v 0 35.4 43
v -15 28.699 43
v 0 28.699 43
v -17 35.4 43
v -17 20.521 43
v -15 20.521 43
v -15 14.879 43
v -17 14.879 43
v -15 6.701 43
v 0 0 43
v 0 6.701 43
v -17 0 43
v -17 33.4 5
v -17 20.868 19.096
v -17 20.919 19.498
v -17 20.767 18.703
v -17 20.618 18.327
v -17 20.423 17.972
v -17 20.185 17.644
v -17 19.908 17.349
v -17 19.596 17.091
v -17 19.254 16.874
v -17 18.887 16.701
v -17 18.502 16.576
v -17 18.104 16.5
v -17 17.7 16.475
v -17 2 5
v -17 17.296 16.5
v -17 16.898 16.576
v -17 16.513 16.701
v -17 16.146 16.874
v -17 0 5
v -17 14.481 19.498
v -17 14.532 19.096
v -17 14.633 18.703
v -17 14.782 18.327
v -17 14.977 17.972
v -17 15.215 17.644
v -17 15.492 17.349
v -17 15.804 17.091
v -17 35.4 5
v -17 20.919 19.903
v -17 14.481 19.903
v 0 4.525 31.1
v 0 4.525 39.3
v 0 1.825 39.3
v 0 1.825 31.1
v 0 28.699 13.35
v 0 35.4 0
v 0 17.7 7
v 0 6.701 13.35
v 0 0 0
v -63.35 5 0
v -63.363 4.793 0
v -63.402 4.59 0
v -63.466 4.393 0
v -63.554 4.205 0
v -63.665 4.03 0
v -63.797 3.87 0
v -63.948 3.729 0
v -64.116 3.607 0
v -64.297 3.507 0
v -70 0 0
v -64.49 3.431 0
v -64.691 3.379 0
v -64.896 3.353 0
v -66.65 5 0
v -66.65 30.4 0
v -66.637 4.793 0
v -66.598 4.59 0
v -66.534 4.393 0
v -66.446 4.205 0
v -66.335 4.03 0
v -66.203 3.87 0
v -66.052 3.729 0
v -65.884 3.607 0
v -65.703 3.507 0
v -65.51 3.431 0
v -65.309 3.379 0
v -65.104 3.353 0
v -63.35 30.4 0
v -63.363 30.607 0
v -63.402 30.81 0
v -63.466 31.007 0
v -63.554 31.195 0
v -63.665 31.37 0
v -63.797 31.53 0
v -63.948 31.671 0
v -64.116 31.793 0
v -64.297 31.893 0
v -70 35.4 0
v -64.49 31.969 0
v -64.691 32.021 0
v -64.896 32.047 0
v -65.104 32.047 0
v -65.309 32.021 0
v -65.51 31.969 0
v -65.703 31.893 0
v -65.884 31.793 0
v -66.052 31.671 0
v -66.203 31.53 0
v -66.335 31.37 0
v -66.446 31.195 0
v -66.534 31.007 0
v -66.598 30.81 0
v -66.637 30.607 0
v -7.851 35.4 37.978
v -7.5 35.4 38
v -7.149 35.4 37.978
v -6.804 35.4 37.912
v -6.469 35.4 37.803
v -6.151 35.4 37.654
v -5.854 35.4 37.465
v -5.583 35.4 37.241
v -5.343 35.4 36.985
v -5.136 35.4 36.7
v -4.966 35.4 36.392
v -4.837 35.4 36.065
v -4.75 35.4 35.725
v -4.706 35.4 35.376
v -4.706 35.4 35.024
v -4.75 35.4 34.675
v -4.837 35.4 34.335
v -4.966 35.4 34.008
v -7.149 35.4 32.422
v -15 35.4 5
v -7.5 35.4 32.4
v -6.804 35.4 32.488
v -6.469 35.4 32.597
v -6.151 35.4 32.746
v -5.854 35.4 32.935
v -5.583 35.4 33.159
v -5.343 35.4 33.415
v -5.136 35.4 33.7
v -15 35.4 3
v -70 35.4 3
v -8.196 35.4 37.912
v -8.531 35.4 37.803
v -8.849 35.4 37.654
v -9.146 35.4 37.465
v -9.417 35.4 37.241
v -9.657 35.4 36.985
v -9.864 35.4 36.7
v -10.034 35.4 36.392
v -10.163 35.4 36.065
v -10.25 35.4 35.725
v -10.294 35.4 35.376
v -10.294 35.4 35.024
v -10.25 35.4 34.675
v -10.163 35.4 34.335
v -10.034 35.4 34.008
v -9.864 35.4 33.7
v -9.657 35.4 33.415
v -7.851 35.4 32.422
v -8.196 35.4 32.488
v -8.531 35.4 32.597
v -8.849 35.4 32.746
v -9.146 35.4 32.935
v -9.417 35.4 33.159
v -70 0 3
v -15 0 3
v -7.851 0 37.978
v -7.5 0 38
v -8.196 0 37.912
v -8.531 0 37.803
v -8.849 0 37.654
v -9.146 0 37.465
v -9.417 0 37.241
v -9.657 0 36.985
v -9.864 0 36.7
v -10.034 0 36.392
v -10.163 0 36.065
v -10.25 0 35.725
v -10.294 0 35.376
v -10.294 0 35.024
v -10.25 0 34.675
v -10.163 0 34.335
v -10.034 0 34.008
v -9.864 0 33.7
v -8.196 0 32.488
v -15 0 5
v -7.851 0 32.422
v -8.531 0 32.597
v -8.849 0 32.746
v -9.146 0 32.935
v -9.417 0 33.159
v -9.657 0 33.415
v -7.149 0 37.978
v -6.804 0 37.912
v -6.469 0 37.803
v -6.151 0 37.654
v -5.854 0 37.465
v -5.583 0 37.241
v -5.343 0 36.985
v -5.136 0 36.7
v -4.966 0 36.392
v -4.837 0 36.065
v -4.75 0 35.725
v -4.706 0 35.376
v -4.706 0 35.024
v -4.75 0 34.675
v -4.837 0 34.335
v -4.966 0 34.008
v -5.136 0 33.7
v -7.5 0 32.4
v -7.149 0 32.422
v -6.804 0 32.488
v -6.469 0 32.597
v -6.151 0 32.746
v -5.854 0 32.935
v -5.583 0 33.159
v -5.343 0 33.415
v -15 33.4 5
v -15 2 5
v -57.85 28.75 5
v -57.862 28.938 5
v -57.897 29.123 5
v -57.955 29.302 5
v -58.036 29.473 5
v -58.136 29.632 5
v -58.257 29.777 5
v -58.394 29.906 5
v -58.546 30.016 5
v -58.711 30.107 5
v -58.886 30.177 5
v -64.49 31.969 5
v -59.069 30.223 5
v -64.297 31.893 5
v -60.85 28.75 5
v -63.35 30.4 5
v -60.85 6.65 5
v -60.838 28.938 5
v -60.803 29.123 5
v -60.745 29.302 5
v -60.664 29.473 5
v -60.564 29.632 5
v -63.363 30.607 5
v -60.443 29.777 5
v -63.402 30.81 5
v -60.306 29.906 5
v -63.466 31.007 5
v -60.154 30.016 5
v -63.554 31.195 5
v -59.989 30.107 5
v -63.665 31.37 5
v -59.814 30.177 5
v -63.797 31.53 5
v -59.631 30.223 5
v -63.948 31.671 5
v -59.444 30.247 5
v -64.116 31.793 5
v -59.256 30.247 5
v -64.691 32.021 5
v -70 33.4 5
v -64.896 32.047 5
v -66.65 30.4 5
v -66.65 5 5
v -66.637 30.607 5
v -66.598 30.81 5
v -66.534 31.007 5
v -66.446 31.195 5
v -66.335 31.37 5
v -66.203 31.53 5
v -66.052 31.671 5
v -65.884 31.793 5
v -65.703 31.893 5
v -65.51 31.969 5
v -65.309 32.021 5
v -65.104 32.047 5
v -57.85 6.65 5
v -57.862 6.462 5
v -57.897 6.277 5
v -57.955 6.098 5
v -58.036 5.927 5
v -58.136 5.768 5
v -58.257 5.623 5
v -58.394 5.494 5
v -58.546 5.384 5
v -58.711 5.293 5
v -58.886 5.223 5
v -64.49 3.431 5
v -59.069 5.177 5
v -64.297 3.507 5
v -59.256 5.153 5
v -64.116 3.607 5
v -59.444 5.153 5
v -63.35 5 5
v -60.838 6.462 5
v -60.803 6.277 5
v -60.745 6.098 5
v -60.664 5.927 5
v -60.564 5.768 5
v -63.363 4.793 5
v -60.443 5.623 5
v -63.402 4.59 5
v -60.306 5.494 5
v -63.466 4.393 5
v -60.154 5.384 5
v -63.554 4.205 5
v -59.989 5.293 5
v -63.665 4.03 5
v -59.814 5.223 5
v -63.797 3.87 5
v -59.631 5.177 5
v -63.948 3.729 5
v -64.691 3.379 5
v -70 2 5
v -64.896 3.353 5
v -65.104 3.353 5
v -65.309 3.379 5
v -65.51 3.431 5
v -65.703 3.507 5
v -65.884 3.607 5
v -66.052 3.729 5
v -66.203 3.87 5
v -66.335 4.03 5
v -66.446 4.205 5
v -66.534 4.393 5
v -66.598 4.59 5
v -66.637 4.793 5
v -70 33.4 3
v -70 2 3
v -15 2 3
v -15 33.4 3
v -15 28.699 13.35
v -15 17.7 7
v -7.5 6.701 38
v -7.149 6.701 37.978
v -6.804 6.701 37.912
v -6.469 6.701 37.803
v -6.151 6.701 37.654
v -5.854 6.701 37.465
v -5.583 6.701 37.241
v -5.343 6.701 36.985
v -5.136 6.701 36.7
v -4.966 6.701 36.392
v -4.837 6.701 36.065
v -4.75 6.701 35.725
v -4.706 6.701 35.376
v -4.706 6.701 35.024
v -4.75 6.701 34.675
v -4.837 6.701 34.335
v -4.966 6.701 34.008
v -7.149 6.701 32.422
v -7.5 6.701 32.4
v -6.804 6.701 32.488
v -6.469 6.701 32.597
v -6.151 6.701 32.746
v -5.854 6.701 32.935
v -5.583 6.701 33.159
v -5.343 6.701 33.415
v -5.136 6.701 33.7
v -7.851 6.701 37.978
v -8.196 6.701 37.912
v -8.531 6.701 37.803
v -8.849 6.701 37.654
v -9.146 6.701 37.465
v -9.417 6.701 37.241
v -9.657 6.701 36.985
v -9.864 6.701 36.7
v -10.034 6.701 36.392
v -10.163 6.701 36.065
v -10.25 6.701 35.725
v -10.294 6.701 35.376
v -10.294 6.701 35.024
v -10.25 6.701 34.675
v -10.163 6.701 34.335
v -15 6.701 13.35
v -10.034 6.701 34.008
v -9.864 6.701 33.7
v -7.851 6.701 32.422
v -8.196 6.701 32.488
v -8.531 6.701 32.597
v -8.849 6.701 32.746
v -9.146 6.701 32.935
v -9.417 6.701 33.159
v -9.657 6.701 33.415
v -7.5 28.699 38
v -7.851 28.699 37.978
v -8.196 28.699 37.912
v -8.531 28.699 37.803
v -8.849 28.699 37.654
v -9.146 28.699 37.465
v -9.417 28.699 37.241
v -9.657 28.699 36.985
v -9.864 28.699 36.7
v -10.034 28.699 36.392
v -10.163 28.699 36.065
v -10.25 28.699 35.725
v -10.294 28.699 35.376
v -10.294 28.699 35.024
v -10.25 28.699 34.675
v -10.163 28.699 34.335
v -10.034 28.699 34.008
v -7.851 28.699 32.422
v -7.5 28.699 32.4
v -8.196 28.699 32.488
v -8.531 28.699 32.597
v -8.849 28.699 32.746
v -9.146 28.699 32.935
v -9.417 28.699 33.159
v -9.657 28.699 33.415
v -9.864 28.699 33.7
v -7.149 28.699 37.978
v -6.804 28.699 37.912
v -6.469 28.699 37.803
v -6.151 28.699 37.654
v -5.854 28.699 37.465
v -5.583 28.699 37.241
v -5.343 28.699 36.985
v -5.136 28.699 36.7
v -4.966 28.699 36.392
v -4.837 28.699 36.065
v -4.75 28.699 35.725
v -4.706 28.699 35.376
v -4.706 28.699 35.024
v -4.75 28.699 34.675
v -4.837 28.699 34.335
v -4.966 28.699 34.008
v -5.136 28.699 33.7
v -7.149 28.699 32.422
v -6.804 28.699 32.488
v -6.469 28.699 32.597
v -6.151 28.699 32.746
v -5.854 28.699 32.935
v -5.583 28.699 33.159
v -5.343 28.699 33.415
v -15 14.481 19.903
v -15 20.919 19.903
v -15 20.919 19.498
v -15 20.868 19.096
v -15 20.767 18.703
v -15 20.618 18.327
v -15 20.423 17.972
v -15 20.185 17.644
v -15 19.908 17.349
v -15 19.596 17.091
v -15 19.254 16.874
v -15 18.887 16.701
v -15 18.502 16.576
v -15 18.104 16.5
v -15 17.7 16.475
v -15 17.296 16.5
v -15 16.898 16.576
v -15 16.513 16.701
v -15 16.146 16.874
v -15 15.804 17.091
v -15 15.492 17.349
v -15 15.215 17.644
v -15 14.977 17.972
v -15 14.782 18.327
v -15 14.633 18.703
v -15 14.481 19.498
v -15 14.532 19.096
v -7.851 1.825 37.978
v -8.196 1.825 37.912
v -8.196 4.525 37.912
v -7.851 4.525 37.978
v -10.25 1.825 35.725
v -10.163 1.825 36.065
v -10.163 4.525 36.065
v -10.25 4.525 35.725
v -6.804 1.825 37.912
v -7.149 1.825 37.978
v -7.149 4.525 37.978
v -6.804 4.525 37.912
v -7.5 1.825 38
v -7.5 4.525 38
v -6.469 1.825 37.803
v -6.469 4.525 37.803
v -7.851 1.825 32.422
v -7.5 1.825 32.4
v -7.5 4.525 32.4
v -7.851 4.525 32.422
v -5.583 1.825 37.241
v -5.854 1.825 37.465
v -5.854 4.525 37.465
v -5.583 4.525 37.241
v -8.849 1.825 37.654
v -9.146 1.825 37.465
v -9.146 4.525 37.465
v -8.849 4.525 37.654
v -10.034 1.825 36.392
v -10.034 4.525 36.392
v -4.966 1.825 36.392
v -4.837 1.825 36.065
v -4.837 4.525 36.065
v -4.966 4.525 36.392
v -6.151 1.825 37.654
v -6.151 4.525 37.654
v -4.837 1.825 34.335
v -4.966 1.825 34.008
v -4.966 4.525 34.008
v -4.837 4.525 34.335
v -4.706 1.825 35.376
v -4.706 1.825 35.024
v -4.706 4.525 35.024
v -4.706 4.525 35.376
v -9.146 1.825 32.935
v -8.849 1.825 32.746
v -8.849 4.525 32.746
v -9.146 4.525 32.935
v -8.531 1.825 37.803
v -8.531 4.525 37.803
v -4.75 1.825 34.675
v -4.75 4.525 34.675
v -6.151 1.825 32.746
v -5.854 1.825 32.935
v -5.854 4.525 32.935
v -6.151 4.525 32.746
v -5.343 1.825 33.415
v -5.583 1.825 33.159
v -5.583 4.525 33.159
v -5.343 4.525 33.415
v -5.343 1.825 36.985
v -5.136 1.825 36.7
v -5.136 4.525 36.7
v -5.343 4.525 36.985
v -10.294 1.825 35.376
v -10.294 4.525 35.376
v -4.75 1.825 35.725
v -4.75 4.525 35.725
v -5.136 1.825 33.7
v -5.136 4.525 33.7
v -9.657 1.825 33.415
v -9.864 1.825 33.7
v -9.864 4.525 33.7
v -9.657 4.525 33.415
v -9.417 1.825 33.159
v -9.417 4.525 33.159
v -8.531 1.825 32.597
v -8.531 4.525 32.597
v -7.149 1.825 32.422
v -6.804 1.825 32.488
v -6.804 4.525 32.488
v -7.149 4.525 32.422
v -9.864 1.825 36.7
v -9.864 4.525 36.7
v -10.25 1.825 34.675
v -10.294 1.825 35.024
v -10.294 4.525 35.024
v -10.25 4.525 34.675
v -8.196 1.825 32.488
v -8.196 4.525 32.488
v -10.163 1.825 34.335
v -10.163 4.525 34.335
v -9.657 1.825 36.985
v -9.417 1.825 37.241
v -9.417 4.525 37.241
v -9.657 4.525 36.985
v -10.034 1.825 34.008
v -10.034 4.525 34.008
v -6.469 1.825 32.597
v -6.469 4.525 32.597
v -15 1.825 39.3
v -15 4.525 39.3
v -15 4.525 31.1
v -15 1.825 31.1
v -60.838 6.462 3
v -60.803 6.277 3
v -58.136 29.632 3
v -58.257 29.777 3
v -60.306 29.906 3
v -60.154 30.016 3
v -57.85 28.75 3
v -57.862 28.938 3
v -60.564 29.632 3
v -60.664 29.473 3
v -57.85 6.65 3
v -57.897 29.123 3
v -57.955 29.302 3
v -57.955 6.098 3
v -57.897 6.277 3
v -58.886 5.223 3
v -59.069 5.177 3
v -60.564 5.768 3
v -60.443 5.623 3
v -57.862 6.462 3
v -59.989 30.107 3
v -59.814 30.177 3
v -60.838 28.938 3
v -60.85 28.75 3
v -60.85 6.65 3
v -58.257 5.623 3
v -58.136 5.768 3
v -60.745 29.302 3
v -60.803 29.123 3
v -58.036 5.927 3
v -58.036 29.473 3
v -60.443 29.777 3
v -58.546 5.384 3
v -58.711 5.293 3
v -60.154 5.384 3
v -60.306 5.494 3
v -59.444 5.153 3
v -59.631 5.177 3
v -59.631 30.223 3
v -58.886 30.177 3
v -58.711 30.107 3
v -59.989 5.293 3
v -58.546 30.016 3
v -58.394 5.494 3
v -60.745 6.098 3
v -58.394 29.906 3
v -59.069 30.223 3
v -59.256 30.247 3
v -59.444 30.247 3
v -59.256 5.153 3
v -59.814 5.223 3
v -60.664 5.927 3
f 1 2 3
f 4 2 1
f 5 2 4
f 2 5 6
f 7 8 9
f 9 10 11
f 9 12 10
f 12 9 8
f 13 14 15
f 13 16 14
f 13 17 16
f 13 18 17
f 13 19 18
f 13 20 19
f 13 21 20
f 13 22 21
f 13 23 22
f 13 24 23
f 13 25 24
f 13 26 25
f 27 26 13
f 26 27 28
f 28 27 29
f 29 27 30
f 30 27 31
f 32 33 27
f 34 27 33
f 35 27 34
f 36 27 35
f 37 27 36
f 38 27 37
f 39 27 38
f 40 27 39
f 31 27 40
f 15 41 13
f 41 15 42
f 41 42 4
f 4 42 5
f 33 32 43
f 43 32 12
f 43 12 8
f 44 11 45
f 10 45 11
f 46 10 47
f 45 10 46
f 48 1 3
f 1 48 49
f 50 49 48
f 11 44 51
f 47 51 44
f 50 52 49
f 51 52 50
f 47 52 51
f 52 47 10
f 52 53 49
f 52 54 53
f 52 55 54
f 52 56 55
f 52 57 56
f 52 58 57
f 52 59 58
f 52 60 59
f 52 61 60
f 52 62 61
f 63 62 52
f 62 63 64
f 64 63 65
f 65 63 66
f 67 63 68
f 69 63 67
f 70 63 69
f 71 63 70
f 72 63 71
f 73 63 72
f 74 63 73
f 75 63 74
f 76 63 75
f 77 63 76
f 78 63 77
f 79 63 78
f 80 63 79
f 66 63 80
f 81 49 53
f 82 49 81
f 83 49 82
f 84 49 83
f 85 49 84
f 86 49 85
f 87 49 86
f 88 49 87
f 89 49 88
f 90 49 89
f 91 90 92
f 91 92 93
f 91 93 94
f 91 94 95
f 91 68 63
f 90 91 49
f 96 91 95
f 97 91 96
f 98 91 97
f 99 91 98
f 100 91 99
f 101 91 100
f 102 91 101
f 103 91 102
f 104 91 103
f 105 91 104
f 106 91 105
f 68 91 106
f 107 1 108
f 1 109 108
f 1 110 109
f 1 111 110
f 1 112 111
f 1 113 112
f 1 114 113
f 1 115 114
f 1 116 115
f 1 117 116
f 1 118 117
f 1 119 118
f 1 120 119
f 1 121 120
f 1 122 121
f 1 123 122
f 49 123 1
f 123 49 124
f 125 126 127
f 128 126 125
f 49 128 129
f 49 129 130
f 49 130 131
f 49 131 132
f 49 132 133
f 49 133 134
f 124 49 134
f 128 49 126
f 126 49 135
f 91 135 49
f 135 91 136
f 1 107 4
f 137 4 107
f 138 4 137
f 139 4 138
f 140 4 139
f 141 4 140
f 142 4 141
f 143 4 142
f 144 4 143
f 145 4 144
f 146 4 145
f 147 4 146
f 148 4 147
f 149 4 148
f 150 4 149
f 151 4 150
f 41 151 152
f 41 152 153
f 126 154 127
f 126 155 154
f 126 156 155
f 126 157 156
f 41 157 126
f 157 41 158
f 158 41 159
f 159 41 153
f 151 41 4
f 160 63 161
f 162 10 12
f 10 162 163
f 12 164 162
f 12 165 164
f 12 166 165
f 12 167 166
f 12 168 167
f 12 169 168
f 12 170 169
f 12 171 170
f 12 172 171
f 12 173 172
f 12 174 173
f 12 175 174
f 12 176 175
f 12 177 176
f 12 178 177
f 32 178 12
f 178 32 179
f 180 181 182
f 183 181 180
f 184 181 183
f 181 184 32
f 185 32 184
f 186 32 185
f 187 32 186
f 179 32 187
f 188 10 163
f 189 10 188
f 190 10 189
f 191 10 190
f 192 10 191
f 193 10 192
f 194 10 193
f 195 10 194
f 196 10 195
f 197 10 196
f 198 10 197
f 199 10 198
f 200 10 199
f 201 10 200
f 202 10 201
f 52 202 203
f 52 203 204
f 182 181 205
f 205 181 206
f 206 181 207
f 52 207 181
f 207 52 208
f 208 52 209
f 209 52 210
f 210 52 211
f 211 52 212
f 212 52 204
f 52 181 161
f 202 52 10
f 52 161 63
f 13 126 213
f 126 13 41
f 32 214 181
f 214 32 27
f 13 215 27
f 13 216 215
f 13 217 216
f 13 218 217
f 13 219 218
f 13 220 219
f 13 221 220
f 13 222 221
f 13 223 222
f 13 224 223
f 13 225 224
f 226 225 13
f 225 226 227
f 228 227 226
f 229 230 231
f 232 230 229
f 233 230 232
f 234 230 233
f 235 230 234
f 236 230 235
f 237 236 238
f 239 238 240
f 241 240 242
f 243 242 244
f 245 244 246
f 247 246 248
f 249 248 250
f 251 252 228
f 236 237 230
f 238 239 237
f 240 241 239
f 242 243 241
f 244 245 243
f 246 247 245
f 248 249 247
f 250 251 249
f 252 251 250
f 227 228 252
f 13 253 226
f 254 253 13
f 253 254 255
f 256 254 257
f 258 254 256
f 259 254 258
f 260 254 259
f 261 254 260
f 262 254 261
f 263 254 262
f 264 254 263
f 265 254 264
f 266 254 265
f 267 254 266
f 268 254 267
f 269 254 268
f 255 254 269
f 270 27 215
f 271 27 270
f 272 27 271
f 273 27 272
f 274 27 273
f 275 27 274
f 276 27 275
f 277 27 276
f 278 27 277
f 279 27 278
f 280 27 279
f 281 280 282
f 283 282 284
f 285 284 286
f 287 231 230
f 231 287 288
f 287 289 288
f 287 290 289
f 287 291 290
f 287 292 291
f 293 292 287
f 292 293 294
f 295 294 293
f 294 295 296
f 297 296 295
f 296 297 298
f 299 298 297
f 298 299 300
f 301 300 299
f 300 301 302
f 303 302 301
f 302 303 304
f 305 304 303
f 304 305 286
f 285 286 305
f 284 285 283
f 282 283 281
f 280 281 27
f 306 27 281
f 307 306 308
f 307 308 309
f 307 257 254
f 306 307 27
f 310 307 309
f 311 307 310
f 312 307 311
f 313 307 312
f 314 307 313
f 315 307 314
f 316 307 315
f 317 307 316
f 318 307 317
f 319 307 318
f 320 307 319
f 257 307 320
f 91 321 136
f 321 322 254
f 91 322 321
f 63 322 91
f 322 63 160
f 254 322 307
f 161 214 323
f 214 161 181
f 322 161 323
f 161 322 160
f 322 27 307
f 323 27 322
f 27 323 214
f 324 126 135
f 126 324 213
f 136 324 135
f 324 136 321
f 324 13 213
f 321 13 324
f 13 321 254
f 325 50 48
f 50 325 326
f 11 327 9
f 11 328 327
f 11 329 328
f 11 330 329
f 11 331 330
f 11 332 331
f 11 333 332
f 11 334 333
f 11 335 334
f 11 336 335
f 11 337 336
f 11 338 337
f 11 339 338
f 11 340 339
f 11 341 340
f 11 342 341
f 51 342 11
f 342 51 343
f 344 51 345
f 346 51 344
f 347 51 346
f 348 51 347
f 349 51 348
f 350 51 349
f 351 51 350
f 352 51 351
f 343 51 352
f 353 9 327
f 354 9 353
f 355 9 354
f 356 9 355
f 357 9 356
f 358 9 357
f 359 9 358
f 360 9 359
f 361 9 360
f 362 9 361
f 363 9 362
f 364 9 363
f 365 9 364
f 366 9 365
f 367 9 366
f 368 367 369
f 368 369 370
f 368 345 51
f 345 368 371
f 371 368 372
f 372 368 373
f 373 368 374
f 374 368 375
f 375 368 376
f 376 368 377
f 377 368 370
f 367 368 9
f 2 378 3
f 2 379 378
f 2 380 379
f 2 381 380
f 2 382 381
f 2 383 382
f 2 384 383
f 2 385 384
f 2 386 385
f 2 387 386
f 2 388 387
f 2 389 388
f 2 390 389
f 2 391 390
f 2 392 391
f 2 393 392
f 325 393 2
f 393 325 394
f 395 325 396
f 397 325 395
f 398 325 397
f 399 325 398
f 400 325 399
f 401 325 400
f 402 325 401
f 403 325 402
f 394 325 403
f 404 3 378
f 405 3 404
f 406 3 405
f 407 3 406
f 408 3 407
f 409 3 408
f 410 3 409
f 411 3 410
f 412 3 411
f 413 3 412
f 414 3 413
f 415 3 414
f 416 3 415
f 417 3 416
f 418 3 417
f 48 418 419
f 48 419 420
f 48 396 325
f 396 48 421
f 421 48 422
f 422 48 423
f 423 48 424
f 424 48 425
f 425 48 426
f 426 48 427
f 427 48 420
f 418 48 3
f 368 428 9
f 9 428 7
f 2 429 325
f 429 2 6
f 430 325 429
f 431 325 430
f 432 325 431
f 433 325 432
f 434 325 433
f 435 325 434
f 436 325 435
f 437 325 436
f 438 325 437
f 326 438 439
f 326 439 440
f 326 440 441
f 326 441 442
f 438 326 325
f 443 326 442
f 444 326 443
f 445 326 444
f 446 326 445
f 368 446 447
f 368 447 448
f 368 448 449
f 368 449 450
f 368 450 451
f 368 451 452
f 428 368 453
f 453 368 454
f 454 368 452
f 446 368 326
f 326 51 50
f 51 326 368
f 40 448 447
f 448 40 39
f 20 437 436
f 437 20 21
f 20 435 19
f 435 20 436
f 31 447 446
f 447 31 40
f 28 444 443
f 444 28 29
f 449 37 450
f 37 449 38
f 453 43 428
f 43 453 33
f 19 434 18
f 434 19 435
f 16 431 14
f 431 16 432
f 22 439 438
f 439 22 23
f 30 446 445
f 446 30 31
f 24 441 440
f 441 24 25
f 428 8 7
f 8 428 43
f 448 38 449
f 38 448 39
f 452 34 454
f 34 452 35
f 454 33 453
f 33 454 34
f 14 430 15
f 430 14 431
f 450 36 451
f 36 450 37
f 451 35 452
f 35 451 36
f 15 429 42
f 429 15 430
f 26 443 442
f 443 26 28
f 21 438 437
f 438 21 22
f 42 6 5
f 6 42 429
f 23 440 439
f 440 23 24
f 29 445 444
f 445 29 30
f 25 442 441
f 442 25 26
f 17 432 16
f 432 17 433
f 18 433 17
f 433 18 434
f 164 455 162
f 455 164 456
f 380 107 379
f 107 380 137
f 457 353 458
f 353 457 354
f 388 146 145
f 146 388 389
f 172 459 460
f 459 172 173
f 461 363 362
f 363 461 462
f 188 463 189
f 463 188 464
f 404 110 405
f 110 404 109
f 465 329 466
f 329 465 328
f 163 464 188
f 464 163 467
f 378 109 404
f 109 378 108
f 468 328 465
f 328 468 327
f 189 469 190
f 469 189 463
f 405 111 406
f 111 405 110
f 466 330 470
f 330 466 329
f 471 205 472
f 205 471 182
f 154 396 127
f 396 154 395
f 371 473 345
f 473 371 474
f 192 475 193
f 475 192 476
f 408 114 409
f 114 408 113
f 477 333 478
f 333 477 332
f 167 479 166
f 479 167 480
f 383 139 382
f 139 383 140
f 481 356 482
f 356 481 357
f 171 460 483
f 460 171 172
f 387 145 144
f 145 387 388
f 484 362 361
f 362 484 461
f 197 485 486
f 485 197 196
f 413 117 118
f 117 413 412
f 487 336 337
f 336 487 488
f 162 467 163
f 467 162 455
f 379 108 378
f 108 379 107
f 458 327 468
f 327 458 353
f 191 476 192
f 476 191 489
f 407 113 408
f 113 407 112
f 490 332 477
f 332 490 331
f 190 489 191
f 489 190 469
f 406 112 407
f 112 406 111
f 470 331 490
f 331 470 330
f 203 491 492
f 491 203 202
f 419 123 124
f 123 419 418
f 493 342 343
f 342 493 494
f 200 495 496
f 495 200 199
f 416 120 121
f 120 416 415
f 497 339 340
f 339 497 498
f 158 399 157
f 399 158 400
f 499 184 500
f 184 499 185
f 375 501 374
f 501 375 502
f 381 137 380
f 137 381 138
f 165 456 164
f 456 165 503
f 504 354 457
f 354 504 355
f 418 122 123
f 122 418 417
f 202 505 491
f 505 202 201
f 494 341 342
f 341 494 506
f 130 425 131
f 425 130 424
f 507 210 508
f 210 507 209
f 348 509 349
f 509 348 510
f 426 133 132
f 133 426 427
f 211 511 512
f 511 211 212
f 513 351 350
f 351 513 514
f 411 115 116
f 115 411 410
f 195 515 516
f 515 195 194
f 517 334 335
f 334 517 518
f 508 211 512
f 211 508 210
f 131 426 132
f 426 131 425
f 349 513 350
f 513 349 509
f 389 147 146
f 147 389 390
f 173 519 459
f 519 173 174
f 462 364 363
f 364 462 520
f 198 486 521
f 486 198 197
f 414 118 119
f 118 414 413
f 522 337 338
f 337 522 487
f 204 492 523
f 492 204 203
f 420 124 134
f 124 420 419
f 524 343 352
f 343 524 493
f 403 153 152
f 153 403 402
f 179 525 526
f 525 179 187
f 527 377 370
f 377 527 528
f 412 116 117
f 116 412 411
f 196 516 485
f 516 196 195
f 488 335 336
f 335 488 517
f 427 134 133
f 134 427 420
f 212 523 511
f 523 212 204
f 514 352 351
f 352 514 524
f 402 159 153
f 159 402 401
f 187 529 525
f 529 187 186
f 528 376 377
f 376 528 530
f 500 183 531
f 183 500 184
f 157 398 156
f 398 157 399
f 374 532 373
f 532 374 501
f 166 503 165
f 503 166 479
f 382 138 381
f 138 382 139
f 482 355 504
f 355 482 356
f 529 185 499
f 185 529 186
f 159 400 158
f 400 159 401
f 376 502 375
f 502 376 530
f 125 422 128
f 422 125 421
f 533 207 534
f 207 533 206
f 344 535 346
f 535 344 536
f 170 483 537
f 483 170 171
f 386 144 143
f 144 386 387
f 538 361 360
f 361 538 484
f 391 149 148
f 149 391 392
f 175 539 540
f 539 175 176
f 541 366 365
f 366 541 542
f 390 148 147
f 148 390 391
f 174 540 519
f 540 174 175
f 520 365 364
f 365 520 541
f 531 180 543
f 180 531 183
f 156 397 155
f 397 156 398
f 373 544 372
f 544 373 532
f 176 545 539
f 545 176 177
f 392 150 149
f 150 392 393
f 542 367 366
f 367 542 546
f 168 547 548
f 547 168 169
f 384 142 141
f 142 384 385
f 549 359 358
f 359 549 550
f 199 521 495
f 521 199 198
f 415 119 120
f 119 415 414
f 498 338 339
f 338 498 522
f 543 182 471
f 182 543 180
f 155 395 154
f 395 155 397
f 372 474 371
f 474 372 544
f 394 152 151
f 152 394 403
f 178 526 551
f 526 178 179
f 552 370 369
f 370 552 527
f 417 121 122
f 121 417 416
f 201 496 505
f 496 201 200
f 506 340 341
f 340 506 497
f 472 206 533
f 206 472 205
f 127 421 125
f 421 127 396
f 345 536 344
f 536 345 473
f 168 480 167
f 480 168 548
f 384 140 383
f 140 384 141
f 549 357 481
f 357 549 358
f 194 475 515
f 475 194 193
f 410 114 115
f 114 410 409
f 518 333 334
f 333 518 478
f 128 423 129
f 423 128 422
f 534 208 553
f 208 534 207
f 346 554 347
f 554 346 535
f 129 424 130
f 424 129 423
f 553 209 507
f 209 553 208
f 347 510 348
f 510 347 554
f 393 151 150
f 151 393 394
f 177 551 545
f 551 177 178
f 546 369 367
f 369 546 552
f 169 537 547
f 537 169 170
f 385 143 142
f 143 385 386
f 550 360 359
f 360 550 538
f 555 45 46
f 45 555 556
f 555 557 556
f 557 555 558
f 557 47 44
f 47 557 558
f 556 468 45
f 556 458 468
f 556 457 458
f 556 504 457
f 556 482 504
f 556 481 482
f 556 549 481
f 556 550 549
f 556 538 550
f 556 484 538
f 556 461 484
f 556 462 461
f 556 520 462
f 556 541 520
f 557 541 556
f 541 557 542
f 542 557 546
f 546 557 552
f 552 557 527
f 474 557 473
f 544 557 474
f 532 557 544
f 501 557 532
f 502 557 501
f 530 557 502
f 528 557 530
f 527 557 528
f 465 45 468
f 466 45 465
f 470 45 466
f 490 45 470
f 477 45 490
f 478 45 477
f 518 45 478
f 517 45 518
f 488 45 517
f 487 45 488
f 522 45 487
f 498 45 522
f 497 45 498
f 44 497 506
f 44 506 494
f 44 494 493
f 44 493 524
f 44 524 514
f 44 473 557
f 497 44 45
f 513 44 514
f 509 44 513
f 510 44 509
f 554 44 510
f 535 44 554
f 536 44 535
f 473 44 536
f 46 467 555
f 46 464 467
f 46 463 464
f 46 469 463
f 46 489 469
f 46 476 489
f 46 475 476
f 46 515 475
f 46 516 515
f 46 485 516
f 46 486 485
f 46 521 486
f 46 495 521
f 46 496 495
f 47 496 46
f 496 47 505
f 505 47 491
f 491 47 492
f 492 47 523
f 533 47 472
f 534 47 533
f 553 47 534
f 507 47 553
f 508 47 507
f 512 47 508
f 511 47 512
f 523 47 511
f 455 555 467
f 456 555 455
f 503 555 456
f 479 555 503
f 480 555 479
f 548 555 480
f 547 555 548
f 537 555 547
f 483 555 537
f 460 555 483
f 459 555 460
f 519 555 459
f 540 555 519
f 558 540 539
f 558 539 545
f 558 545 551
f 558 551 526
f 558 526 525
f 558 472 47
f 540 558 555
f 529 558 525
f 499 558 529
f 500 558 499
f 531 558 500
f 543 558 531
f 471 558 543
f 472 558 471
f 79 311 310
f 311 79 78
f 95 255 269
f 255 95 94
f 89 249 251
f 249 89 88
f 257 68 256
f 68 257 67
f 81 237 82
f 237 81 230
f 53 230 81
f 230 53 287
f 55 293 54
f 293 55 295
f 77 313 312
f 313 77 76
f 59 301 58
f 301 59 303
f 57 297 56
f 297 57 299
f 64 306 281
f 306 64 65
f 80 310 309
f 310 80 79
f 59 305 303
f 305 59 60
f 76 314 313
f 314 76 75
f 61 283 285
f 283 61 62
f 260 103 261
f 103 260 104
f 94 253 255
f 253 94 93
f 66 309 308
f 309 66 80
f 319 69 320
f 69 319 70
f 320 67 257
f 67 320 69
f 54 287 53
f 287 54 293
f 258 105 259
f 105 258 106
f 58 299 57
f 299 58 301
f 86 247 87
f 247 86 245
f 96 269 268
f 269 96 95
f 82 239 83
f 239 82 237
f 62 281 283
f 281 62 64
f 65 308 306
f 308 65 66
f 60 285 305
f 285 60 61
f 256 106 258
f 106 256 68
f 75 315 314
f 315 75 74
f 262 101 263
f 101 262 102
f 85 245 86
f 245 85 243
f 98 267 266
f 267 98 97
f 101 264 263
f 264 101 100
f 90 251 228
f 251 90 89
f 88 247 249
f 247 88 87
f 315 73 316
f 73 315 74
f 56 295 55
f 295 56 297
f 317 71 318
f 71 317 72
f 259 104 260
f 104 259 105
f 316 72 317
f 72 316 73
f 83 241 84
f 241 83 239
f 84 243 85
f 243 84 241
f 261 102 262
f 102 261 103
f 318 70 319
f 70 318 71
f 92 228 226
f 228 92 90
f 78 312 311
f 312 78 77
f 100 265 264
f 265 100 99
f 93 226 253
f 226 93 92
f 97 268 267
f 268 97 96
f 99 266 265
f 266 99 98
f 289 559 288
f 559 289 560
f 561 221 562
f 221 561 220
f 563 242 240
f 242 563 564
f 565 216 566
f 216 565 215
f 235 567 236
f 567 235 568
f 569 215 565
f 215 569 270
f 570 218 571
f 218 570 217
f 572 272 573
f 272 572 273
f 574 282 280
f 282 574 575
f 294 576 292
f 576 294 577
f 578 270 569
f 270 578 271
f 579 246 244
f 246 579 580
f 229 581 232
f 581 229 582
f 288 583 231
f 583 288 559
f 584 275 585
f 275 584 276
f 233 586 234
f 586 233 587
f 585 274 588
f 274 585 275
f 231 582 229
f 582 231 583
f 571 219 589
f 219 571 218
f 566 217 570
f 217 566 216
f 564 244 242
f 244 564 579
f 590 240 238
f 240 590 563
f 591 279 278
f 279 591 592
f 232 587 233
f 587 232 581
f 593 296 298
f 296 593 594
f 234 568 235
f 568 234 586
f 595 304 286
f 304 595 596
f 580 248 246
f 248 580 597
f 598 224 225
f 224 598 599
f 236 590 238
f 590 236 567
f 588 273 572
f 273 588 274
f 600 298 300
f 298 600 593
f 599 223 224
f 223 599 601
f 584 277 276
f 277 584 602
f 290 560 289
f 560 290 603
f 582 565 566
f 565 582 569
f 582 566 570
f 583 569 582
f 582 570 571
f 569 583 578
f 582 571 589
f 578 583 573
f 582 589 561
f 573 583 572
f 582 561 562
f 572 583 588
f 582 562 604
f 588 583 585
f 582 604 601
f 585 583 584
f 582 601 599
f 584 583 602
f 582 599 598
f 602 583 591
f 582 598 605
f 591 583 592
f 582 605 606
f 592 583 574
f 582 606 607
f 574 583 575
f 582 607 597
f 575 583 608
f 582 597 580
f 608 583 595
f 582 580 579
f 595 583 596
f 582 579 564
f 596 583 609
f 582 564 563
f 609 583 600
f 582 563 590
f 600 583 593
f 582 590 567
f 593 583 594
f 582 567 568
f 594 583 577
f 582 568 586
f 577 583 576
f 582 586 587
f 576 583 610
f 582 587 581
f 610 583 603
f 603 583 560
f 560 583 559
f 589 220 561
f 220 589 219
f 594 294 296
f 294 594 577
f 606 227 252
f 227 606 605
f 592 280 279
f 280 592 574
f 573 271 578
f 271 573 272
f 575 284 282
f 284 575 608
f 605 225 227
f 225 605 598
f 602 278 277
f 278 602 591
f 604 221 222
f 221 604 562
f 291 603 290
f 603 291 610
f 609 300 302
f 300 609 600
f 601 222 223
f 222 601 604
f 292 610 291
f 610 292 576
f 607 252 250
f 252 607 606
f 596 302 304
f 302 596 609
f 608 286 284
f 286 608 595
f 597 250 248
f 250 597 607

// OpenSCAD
height = 70;
spindlePortionHeight = 15;
coletteHolderClearance = 2;//6;
spindleShaftDiameter = 25.4;//14.5;
holeSpacing = 19;
insetDepth = 2;
insetHeight = 3;
insetOffsetFromHoles = 4;
separation = 1;
m3 = 3.3;
m3NutWidth = 5.7;
m3nutHeight = 2;
wallThickness = 5;
sideCutoff = 3;

m5 = 5.6;
m5NutWidth = 8.2;
m5NutHeight = 2.7;

probeOffset = 5;

sides = 6;
lipHeight = 2;
lipMinDiameter = 25.4/4 +0.1;

length = 2*wallThickness+max(holeSpacing,spindleShaftDiameter);
rotate([0,-90,0])
difference() {
    union() {
        cube([wallThickness+coletteHolderClearance+spindleShaftDiameter+wallThickness+m5, length,spindlePortionHeight+lipHeight]);
        cube([wallThickness, length,height]);
    }
    hull() {
        translate([wallThickness+coletteHolderClearance+spindleShaftDiameter/2,length/2,0])
            cylinder(r=spindleShaftDiameter/2, h=spindlePortionHeight, $fn=sides);
        translate([wallThickness+coletteHolderClearance+spindleShaftDiameter+wallThickness+m5,length/2,0])
            cylinder(r=spindleShaftDiameter/2, h=spindlePortionHeight, $fn=sides);
    }
    hull() {
        translate([wallThickness+coletteHolderClearance+spindleShaftDiameter/2,length/2,0])
            cylinder(r=lipMinDiameter/2, h=spindlePortionHeight+lipHeight, $fn=50);
        translate([wallThickness+coletteHolderClearance+spindleShaftDiameter+wallThickness+m5,length/2,0])
            cylinder(r=lipMinDiameter/2, h=spindlePortionHeight+lipHeight, $fn=sides);
    }
    translate([wallThickness+coletteHolderClearance+spindleShaftDiameter+m5/2,0,spindlePortionHeight/2]) rotate([-90,0,0]) {
        cylinder(r=m5/2,h=length,$fn=50);
    }
    translate([wallThickness+coletteHolderClearance+spindleShaftDiameter+m5/2-m5NutWidth/2,(length-spindleShaftDiameter)/4-m5NutHeight/4,0])
        cube([m5NutWidth,m5NutHeight,spindlePortionHeight]);
    hull() {
        translate([0,wallThickness,height-probeOffset]) rotate([0,90,0])
            cylinder(r=m3/2,h=length,$fn=50);
        translate([0,length-wallThickness,height-probeOffset]) rotate([0,90,0])
            cylinder(r=m3/2,h=length,$fn=50);
    }
    hull() {
        translate([wallThickness-insetDepth,wallThickness+m3/2,height-probeOffset-insetOffsetFromHoles-m3/2]) rotate([0,90,0])
            cylinder(r=insetHeight/2,h=insetDepth,$fn=50);
        translate([wallThickness-insetDepth,length-wallThickness-m3/2,height-probeOffset-insetOffsetFromHoles-m3/2]) rotate([0,90,0])
            cylinder(r=insetHeight/2,h=insetDepth,$fn=50);
    }
    
    translate([wallThickness-insetDepth,0,spindlePortionHeight]) {
        cube([insetDepth, wallThickness-sideCutoff,height]);
        translate([0,length-wallThickness+sideCutoff,0])
            cube([insetDepth, wallThickness-sideCutoff,height]);
    }
}
